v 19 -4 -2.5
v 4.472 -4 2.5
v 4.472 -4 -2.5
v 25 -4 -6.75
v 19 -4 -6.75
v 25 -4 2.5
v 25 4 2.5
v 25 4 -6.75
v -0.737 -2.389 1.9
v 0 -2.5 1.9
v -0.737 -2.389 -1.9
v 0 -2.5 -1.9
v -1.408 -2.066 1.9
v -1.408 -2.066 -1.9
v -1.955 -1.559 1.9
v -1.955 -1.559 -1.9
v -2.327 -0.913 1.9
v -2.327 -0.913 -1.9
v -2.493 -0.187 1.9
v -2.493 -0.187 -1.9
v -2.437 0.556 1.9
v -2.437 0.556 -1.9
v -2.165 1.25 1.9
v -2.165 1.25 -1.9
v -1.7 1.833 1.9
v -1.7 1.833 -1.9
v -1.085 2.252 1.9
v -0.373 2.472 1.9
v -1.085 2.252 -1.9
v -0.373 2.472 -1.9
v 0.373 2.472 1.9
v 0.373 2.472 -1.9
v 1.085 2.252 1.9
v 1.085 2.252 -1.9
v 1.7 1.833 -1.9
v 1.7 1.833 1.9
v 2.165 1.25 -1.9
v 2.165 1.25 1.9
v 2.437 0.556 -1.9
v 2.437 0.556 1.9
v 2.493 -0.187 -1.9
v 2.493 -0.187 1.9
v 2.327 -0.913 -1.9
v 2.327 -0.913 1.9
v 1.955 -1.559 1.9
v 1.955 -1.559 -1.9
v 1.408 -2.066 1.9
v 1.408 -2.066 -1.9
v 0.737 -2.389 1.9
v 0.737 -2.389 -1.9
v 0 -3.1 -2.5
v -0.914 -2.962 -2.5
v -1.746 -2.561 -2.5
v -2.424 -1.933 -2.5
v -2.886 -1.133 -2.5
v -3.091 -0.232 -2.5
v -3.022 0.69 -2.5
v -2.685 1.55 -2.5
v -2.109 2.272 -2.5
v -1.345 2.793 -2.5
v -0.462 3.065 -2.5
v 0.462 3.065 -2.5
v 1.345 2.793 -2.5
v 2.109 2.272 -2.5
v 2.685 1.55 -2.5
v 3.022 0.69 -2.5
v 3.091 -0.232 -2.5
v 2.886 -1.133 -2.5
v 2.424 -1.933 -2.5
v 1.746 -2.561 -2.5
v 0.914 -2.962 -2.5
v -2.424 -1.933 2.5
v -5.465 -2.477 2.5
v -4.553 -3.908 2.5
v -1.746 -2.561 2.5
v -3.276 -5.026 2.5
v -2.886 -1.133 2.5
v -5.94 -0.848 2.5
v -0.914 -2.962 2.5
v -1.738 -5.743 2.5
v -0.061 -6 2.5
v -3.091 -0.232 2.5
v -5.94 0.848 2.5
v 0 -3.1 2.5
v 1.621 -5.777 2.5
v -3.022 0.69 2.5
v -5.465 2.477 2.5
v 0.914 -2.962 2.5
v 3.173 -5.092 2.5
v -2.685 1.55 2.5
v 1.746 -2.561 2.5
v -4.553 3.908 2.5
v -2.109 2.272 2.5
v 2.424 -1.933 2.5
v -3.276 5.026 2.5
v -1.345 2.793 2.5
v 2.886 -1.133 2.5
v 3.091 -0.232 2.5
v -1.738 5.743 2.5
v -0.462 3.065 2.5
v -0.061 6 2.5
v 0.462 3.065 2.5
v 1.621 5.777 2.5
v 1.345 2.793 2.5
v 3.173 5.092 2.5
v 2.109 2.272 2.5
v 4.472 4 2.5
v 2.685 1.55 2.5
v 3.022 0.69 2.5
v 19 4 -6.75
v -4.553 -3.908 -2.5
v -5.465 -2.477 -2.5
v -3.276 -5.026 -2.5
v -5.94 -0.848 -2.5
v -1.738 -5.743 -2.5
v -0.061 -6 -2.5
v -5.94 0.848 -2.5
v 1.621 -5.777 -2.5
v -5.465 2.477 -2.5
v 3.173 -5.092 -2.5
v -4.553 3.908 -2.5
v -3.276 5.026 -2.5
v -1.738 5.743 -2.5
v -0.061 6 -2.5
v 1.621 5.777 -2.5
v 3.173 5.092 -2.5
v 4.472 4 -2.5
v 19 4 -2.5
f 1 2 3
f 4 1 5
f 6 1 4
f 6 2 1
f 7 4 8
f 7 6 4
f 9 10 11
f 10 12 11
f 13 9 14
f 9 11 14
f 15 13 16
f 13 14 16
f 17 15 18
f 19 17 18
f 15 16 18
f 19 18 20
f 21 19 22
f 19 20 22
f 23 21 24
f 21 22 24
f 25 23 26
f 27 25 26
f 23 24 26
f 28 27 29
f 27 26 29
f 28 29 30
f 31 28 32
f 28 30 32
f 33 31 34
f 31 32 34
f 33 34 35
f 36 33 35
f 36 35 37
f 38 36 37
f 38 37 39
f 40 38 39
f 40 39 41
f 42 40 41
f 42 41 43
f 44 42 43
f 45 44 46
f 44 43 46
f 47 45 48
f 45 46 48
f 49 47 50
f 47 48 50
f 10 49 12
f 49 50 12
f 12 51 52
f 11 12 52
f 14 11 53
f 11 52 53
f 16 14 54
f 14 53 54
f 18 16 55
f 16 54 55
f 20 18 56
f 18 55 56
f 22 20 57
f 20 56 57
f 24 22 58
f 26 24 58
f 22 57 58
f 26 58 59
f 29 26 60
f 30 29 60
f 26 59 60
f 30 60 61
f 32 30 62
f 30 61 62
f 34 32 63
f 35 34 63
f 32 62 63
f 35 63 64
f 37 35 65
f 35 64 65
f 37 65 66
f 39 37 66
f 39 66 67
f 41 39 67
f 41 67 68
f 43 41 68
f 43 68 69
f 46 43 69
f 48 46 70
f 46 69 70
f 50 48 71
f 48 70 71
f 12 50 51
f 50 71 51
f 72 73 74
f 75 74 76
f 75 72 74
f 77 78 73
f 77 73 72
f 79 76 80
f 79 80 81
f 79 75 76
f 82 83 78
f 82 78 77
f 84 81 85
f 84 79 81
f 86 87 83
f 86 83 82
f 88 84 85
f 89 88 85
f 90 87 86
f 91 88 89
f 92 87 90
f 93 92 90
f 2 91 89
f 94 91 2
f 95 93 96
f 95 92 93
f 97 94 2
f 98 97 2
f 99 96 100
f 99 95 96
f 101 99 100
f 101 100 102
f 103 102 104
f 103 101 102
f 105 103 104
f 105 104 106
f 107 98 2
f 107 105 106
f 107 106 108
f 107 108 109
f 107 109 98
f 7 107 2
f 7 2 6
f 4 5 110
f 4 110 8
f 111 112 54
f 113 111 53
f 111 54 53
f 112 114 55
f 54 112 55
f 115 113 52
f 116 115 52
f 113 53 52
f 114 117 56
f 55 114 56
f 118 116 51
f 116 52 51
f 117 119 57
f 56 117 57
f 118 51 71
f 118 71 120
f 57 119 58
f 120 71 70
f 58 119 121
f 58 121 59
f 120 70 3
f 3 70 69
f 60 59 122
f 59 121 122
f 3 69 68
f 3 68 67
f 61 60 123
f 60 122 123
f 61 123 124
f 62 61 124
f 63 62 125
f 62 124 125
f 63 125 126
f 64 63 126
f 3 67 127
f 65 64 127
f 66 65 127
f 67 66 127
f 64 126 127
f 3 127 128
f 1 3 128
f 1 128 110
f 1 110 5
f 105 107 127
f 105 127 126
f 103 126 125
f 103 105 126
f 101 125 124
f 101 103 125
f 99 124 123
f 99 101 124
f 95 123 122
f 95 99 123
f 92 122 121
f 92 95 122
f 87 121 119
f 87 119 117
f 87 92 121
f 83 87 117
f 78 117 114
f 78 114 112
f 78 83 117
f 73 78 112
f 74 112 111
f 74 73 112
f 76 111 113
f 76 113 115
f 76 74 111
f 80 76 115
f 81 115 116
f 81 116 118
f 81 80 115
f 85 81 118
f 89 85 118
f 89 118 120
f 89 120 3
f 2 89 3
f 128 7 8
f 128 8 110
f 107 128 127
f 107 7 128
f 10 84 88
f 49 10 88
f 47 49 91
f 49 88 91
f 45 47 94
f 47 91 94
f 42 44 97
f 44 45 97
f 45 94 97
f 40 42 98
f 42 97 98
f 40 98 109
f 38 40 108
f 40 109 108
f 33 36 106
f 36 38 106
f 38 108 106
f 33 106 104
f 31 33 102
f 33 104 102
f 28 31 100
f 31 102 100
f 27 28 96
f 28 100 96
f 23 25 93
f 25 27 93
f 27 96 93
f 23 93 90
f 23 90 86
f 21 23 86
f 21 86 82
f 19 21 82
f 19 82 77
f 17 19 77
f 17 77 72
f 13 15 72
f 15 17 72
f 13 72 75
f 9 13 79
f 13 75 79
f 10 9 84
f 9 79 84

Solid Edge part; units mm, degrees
sketch "Sketch1" plane through (0, 0, 0) normal (0, 0, 1) x (1, 0, 0)
  circle A0 centre (0, 0) radius 6
  dimension "D1" = 12
extrude "Protrusion1" add sketch "Sketch1" along normal mid plane 5
hole "hole" at (0, 0, 2.5) direction (0, 0, -1) diameter 5 depth 30 tip angle 118 start chamfer 0.6 start chamfer angle 45 end chamfer 0.6 end chamfer angle 45
sketch "Sketch2" plane through (0, 0, 2.5) normal (0, 0, 1) x (-1, 0, 0)
  line L0 (-25, -4) -> (-4.4721, -4)
  line L1 (-4.4721, -4) -> (-4.4721, 4)
  line L2 (-4.4721, 4) -> (-25, 4)
  line L3 (-25, 4) -> (-25, -4)
  dimension "D1" = 8
  dimension "D2" = 25
extrude "Protrusion2" add sketch "Sketch2" against normal up to vertex (5 mm away)
sketch "Sketch3" plane through (12, 0, -2.5) normal (0, 0, -1) x (1, 0, 0)
  line L0 (13, 4) -> (13, -4)
  line L1 (13, -4) -> (7, -4)
  line L2 (7, -4) -> (7, 4)
  line L3 (7, 4) -> (13, 4)
  dimension "D1" = 6
extrude "ExtrudedProtrusion_4" add sketch "Sketch3" along normal blind 4.25
properties material "Polyethylene, low density"
